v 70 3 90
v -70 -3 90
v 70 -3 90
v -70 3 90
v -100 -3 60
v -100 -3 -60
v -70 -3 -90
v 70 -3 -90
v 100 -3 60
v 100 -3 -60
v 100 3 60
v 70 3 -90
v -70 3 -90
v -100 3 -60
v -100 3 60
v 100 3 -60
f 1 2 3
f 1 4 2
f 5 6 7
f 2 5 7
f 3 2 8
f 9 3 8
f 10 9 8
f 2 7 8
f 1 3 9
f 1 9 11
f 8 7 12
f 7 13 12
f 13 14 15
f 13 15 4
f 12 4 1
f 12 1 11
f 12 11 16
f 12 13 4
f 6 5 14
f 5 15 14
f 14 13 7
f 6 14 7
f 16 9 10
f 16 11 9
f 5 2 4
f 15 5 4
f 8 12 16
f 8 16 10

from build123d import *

# Parameters (mm, degrees)
ESBO_O1_W                = 200
ESBO_O1_H                = 180
RESSALTO_EXTRUS_O1_DEPTH = 3
CHANFRO1_SIZE            = 30


with BuildPart() as part:
    # Esboço1 → Ressalto-extrusão1 (new, symmetric)
    with BuildSketch(Plane(origin=(0, 0, 0), x_dir=(1, 0, 0), z_dir=(0, 1, 0))):
        Rectangle(ESBO_O1_W, ESBO_O1_H)
    extrude(amount=RESSALTO_EXTRUS_O1_DEPTH, both=True)

    # Chanfro1
    chanfro1_edges = [part.edges().sort_by_distance(p)[0] for p in [
        (100, 0, 90),
        (-100, 0, 90),
        (-100, 0, -90),
        (100, 0, -90),
    ]]
    chamfer(chanfro1_edges, length=CHANFRO1_SIZE)


solid = part.part
